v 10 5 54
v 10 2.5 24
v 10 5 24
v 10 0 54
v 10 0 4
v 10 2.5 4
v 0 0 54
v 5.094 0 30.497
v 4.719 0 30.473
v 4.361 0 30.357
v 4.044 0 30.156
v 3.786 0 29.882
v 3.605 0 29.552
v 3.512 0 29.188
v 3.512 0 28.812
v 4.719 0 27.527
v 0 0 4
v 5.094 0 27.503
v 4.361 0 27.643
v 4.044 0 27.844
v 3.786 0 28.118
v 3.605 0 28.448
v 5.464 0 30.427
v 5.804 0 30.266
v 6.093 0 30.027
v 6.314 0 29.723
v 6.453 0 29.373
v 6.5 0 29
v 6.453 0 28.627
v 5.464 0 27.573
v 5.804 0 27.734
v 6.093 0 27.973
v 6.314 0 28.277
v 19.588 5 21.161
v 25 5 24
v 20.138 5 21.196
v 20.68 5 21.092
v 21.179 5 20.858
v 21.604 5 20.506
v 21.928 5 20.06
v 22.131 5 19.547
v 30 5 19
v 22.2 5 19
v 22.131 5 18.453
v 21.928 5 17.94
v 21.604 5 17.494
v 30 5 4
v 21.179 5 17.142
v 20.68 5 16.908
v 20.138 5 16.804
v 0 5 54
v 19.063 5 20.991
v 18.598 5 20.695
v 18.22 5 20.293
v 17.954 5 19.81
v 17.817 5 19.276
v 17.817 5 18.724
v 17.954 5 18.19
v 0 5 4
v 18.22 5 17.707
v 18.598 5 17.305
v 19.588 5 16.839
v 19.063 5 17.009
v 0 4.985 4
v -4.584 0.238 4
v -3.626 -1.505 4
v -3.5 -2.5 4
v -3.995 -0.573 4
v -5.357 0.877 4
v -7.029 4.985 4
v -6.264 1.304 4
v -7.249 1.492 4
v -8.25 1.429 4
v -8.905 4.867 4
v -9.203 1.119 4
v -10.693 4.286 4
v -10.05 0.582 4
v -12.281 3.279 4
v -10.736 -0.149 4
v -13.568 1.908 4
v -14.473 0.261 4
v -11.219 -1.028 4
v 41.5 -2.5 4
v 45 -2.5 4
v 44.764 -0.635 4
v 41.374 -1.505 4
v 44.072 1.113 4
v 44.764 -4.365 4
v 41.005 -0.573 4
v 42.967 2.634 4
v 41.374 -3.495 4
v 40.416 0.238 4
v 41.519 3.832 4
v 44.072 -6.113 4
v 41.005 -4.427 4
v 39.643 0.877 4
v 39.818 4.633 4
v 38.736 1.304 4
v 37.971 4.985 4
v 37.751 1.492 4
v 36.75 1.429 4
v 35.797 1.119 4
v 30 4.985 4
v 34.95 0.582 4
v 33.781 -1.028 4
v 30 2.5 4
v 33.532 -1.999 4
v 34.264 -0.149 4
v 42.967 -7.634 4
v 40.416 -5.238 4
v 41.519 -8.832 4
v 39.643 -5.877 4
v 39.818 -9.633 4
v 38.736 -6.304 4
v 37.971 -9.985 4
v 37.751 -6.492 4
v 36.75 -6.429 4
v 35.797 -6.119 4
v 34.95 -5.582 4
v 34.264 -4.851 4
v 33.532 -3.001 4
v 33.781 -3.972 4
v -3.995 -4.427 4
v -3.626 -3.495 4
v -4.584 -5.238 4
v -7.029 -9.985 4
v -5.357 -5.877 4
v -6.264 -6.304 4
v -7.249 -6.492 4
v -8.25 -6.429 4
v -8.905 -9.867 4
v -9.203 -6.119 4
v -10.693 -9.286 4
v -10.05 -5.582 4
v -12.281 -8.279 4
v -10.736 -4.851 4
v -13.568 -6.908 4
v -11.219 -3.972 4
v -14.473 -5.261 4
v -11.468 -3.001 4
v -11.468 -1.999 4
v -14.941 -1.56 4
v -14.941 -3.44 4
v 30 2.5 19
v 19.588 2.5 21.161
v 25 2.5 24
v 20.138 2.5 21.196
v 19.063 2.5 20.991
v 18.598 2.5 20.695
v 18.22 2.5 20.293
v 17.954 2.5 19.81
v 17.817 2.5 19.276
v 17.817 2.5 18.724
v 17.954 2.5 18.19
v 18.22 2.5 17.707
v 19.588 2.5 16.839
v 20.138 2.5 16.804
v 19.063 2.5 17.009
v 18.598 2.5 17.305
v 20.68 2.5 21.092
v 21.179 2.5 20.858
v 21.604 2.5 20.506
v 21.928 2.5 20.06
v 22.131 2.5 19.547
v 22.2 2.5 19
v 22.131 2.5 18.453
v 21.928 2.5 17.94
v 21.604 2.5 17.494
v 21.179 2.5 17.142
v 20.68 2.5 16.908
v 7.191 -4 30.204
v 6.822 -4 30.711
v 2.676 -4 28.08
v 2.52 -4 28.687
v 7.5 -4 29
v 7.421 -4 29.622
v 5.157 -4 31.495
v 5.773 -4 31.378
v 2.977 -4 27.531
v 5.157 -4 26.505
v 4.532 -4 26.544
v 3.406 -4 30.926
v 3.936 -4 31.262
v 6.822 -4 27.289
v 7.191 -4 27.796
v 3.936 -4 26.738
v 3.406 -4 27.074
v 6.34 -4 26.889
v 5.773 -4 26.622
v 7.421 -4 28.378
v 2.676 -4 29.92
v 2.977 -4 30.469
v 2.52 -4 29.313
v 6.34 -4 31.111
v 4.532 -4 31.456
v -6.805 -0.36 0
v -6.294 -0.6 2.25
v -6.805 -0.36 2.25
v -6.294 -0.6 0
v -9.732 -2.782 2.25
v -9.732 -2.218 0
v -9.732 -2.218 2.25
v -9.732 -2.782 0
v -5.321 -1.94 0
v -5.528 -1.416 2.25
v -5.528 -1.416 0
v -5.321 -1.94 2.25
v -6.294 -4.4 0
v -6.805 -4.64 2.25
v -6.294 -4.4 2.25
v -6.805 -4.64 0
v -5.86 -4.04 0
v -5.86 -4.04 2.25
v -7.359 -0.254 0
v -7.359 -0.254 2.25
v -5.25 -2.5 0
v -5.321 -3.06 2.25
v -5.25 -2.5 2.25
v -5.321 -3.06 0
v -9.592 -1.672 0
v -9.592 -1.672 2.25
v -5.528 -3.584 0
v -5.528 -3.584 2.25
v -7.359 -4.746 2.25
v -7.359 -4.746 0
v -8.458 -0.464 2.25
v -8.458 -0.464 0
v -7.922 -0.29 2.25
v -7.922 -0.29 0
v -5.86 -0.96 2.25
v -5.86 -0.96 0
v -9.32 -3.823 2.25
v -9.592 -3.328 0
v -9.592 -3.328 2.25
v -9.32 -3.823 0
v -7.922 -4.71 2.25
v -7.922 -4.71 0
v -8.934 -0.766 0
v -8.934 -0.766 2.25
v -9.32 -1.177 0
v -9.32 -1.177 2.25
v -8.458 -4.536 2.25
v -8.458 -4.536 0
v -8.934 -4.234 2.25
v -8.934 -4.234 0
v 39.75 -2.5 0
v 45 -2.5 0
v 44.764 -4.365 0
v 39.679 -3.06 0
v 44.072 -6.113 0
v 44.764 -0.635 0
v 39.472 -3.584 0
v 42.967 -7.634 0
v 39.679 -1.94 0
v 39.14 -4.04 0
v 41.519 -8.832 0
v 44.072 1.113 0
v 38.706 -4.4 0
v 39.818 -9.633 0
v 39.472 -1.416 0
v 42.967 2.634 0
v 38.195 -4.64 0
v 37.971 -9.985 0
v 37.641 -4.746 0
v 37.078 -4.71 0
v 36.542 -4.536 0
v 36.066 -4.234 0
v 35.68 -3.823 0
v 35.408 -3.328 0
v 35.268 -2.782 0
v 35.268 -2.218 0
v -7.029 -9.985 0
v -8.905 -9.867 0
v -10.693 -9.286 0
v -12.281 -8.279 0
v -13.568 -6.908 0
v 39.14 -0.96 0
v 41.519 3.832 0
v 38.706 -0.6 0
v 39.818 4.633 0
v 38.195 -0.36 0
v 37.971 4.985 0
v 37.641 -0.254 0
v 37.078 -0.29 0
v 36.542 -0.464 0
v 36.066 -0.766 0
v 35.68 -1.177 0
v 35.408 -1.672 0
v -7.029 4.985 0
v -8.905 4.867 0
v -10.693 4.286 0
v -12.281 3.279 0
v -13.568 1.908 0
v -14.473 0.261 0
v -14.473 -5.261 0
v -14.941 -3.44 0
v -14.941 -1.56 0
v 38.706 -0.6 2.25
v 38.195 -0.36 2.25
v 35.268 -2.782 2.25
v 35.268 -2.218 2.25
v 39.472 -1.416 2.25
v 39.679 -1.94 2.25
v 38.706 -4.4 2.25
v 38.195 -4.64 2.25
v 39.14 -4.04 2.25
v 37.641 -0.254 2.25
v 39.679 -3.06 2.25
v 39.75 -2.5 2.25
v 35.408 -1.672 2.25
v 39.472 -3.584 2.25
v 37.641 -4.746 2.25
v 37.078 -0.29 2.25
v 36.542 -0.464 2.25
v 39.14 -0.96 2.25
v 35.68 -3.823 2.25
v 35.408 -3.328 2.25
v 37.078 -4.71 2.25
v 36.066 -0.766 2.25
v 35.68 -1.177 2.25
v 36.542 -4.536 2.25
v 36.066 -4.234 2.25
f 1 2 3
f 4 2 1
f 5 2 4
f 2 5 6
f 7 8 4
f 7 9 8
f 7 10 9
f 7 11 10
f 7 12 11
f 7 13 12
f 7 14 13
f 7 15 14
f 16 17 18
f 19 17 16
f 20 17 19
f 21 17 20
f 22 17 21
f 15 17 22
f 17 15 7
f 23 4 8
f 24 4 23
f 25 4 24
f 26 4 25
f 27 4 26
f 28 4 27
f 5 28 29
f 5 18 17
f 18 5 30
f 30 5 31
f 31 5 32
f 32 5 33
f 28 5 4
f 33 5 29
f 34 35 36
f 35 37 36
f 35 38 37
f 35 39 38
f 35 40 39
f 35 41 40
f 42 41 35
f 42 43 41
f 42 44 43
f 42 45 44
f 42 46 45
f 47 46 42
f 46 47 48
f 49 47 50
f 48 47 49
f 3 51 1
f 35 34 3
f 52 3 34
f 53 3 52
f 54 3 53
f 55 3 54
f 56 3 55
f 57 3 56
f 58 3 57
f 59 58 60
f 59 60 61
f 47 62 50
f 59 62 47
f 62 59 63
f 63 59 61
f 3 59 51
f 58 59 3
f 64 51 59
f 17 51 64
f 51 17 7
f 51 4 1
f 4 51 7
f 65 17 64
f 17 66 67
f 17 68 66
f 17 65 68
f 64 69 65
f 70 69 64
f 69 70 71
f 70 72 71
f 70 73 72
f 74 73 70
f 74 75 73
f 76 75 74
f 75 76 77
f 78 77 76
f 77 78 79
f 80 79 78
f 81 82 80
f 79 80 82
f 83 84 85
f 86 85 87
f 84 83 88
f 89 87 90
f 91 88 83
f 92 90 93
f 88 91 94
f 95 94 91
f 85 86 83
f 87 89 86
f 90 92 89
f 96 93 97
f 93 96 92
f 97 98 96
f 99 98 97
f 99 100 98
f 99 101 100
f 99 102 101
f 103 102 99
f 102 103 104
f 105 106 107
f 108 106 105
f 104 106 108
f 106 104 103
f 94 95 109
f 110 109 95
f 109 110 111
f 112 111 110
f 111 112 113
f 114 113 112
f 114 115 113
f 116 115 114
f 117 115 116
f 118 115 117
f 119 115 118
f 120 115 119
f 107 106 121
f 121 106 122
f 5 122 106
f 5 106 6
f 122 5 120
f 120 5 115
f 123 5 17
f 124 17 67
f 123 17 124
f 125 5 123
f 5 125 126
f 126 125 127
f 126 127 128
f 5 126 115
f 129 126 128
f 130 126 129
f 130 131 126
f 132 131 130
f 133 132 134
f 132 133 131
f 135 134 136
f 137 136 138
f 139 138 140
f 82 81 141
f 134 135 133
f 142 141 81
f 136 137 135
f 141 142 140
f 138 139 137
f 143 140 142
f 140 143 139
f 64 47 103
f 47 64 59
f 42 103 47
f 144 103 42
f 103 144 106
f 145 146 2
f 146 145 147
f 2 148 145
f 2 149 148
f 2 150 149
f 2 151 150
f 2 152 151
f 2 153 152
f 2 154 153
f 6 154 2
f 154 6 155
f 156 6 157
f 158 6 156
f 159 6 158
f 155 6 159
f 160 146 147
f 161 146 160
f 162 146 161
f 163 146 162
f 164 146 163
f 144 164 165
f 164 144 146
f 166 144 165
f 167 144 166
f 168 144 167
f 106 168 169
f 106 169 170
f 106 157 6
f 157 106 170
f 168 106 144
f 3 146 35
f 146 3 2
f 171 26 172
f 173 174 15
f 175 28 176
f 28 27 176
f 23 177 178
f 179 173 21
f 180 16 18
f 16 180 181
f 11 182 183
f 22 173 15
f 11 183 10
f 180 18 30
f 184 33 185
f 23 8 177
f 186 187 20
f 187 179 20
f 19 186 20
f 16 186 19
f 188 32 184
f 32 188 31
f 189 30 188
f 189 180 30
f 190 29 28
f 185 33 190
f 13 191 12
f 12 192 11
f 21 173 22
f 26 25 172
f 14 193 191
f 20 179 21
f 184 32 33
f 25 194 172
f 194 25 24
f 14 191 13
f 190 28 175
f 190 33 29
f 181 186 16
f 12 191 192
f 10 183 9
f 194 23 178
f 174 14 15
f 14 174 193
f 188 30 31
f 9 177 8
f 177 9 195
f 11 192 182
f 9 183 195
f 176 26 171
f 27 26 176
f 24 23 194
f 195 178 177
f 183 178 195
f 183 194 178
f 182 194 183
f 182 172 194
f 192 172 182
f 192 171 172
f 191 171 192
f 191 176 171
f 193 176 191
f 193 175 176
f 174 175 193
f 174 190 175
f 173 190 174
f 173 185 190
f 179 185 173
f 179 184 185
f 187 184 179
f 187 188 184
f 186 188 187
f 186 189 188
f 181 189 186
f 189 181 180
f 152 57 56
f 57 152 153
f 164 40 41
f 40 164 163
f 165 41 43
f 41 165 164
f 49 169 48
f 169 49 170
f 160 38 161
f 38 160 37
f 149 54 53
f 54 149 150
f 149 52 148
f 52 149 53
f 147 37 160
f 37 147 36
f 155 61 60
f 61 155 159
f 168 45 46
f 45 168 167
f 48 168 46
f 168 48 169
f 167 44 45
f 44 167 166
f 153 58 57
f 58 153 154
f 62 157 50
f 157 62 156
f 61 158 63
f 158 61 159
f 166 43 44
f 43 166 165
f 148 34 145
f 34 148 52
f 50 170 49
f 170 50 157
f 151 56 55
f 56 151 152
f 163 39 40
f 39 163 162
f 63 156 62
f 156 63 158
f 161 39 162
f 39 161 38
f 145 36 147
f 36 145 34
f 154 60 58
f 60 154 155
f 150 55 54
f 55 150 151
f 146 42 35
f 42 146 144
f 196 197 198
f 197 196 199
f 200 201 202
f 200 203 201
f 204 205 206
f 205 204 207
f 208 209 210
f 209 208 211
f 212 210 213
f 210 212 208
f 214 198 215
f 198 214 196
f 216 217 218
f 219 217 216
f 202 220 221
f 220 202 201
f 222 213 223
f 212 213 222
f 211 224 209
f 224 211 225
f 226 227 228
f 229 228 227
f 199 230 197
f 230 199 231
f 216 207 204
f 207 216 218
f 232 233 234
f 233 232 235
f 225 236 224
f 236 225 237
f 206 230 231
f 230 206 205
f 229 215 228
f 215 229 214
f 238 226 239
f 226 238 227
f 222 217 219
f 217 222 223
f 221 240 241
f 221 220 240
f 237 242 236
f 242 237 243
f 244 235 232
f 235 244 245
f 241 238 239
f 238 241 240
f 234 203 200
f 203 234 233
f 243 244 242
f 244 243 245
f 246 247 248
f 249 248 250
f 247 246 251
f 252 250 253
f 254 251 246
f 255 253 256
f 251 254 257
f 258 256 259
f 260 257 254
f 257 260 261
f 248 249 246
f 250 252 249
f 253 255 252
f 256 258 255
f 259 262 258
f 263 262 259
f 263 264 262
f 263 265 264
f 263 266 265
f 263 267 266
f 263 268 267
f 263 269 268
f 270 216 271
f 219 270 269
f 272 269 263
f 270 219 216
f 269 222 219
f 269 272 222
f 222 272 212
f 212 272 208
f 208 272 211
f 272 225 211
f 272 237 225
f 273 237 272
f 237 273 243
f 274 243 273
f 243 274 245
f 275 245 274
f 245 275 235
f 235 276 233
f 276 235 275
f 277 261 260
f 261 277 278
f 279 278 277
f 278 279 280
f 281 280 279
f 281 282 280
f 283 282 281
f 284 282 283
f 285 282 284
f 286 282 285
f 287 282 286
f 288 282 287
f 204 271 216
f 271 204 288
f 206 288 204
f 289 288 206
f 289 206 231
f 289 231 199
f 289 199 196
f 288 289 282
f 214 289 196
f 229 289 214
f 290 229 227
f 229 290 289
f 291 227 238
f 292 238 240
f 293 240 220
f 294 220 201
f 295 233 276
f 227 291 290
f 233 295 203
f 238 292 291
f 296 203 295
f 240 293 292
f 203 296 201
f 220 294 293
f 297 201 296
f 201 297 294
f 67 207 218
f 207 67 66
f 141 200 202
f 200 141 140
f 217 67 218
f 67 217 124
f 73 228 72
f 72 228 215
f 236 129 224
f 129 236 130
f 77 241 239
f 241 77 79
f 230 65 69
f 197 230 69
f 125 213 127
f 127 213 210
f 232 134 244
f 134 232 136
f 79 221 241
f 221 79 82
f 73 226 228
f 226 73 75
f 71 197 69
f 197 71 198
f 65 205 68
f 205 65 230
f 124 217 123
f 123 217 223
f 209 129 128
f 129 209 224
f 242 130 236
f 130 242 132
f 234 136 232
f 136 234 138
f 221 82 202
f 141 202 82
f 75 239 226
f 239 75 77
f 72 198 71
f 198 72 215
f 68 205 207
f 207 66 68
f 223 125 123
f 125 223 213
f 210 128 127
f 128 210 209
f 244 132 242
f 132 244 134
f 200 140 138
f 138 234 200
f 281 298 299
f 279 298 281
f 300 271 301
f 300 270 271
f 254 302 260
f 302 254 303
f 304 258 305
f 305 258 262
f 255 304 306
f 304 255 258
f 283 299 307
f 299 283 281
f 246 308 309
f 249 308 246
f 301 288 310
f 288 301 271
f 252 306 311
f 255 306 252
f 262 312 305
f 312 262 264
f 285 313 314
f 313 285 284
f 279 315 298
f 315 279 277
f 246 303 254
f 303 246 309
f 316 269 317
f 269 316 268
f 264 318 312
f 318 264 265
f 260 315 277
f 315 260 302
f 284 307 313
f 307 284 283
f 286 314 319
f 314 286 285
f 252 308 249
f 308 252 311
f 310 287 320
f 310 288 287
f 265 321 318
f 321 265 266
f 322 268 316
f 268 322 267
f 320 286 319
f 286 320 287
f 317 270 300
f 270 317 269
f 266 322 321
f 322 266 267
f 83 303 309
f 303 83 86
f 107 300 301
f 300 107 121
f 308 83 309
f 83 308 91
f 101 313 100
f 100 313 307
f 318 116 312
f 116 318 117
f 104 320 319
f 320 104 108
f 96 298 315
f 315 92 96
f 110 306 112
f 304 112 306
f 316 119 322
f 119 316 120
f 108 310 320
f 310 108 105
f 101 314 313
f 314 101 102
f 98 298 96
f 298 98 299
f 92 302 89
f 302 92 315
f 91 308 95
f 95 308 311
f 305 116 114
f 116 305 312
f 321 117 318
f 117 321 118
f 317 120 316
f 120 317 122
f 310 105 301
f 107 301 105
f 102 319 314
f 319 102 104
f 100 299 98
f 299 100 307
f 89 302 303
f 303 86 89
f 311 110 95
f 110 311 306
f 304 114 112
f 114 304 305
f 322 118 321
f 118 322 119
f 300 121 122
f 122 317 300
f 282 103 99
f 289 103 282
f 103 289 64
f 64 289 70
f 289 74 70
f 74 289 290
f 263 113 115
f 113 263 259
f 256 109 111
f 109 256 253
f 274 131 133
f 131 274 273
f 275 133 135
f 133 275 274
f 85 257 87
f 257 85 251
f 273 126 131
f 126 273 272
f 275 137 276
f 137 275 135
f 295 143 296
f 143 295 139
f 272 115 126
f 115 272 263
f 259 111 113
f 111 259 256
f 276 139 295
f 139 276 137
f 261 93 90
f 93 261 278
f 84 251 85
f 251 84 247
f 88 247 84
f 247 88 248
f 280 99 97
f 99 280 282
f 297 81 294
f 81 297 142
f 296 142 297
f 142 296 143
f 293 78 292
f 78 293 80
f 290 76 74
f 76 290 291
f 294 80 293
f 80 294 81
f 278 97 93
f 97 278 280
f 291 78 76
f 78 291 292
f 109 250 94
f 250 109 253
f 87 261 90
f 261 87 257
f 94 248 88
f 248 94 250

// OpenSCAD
include <MCAD/triangles.scad>

$fn = 25;
w_block = 10;
h_block = 50;
d_block = 5;

w_hinge = 20;
h_hinge = 20;
d_hinge = d_block/2;

y_pivot = 15;
x_pivot = 20;
dia_pivot = 4.4;

x_cone = w_block/2;
y_cone = 25;
dia_cone_base = 3;
dia_cone_top = 5;
h_cone = 4;

tri_x = 5;
tri_y = 5;

//base dims
thk_feet = 4;
screw_hole_dia = 4.5;
csk_depth = 4;
csk_dia = 8;
feet_centres = 45;
d_feet = 15;


//main block workplane
translate([0,d_block,thk_feet])
rotate([90,0,0])
{
difference()
    {
union()
    {
    //base block    
    cube([w_block,h_block,d_block]);
    //main cutout
    translate([w_block,0,0])
        cube([w_hinge,h_hinge,d_hinge]);
        //cone
    translate([x_cone,y_cone,d_block])
        cylinder(d1=dia_cone_base,d2=dia_cone_top,h=h_cone);
    }
    //hole
    translate([x_pivot,y_pivot,0])
        cylinder(d=dia_pivot,h=d_block);


    
    //hinge block chamfer
    translate([w_hinge+w_block,h_hinge,0])
    rotate([0,0,180])
    {
        triangle(tri_x,tri_y,d_block);
    }
}    
} //end of main block workplane

translate([-7.5,-2.5,0])
foot();

module foot()
    {
        
    difference()
    {
        //rounded foot shape
        hull()
        {
            cylinder(d=d_feet,h=thk_feet);
            translate([feet_centres,0,0])    
                cylinder(d=d_feet,h=thk_feet);
        }
        //screw hole and countersinks
        translate([0,0,thk_feet])
            csk_screw_hole(screw_hole_dia,thk_feet,csk_dia,csk_depth);
        translate([feet_centres,0,thk_feet])
            csk_screw_hole(screw_hole_dia,thk_feet,csk_dia,csk_depth);
    }
}    
    
module csk_screw_hole(screw_dia, screw_depth, csk_dia, csk_depth)
{
    translate([0,0,-screw_depth])
        cylinder(d=screw_dia,h=screw_depth);
    
    translate([0,0,-csk_depth])
//        cylinder(d1=screw_dia,d2=csk_dia,csk_depth);
        cylinder(d1=0,d2=csk_dia,csk_depth);
}
